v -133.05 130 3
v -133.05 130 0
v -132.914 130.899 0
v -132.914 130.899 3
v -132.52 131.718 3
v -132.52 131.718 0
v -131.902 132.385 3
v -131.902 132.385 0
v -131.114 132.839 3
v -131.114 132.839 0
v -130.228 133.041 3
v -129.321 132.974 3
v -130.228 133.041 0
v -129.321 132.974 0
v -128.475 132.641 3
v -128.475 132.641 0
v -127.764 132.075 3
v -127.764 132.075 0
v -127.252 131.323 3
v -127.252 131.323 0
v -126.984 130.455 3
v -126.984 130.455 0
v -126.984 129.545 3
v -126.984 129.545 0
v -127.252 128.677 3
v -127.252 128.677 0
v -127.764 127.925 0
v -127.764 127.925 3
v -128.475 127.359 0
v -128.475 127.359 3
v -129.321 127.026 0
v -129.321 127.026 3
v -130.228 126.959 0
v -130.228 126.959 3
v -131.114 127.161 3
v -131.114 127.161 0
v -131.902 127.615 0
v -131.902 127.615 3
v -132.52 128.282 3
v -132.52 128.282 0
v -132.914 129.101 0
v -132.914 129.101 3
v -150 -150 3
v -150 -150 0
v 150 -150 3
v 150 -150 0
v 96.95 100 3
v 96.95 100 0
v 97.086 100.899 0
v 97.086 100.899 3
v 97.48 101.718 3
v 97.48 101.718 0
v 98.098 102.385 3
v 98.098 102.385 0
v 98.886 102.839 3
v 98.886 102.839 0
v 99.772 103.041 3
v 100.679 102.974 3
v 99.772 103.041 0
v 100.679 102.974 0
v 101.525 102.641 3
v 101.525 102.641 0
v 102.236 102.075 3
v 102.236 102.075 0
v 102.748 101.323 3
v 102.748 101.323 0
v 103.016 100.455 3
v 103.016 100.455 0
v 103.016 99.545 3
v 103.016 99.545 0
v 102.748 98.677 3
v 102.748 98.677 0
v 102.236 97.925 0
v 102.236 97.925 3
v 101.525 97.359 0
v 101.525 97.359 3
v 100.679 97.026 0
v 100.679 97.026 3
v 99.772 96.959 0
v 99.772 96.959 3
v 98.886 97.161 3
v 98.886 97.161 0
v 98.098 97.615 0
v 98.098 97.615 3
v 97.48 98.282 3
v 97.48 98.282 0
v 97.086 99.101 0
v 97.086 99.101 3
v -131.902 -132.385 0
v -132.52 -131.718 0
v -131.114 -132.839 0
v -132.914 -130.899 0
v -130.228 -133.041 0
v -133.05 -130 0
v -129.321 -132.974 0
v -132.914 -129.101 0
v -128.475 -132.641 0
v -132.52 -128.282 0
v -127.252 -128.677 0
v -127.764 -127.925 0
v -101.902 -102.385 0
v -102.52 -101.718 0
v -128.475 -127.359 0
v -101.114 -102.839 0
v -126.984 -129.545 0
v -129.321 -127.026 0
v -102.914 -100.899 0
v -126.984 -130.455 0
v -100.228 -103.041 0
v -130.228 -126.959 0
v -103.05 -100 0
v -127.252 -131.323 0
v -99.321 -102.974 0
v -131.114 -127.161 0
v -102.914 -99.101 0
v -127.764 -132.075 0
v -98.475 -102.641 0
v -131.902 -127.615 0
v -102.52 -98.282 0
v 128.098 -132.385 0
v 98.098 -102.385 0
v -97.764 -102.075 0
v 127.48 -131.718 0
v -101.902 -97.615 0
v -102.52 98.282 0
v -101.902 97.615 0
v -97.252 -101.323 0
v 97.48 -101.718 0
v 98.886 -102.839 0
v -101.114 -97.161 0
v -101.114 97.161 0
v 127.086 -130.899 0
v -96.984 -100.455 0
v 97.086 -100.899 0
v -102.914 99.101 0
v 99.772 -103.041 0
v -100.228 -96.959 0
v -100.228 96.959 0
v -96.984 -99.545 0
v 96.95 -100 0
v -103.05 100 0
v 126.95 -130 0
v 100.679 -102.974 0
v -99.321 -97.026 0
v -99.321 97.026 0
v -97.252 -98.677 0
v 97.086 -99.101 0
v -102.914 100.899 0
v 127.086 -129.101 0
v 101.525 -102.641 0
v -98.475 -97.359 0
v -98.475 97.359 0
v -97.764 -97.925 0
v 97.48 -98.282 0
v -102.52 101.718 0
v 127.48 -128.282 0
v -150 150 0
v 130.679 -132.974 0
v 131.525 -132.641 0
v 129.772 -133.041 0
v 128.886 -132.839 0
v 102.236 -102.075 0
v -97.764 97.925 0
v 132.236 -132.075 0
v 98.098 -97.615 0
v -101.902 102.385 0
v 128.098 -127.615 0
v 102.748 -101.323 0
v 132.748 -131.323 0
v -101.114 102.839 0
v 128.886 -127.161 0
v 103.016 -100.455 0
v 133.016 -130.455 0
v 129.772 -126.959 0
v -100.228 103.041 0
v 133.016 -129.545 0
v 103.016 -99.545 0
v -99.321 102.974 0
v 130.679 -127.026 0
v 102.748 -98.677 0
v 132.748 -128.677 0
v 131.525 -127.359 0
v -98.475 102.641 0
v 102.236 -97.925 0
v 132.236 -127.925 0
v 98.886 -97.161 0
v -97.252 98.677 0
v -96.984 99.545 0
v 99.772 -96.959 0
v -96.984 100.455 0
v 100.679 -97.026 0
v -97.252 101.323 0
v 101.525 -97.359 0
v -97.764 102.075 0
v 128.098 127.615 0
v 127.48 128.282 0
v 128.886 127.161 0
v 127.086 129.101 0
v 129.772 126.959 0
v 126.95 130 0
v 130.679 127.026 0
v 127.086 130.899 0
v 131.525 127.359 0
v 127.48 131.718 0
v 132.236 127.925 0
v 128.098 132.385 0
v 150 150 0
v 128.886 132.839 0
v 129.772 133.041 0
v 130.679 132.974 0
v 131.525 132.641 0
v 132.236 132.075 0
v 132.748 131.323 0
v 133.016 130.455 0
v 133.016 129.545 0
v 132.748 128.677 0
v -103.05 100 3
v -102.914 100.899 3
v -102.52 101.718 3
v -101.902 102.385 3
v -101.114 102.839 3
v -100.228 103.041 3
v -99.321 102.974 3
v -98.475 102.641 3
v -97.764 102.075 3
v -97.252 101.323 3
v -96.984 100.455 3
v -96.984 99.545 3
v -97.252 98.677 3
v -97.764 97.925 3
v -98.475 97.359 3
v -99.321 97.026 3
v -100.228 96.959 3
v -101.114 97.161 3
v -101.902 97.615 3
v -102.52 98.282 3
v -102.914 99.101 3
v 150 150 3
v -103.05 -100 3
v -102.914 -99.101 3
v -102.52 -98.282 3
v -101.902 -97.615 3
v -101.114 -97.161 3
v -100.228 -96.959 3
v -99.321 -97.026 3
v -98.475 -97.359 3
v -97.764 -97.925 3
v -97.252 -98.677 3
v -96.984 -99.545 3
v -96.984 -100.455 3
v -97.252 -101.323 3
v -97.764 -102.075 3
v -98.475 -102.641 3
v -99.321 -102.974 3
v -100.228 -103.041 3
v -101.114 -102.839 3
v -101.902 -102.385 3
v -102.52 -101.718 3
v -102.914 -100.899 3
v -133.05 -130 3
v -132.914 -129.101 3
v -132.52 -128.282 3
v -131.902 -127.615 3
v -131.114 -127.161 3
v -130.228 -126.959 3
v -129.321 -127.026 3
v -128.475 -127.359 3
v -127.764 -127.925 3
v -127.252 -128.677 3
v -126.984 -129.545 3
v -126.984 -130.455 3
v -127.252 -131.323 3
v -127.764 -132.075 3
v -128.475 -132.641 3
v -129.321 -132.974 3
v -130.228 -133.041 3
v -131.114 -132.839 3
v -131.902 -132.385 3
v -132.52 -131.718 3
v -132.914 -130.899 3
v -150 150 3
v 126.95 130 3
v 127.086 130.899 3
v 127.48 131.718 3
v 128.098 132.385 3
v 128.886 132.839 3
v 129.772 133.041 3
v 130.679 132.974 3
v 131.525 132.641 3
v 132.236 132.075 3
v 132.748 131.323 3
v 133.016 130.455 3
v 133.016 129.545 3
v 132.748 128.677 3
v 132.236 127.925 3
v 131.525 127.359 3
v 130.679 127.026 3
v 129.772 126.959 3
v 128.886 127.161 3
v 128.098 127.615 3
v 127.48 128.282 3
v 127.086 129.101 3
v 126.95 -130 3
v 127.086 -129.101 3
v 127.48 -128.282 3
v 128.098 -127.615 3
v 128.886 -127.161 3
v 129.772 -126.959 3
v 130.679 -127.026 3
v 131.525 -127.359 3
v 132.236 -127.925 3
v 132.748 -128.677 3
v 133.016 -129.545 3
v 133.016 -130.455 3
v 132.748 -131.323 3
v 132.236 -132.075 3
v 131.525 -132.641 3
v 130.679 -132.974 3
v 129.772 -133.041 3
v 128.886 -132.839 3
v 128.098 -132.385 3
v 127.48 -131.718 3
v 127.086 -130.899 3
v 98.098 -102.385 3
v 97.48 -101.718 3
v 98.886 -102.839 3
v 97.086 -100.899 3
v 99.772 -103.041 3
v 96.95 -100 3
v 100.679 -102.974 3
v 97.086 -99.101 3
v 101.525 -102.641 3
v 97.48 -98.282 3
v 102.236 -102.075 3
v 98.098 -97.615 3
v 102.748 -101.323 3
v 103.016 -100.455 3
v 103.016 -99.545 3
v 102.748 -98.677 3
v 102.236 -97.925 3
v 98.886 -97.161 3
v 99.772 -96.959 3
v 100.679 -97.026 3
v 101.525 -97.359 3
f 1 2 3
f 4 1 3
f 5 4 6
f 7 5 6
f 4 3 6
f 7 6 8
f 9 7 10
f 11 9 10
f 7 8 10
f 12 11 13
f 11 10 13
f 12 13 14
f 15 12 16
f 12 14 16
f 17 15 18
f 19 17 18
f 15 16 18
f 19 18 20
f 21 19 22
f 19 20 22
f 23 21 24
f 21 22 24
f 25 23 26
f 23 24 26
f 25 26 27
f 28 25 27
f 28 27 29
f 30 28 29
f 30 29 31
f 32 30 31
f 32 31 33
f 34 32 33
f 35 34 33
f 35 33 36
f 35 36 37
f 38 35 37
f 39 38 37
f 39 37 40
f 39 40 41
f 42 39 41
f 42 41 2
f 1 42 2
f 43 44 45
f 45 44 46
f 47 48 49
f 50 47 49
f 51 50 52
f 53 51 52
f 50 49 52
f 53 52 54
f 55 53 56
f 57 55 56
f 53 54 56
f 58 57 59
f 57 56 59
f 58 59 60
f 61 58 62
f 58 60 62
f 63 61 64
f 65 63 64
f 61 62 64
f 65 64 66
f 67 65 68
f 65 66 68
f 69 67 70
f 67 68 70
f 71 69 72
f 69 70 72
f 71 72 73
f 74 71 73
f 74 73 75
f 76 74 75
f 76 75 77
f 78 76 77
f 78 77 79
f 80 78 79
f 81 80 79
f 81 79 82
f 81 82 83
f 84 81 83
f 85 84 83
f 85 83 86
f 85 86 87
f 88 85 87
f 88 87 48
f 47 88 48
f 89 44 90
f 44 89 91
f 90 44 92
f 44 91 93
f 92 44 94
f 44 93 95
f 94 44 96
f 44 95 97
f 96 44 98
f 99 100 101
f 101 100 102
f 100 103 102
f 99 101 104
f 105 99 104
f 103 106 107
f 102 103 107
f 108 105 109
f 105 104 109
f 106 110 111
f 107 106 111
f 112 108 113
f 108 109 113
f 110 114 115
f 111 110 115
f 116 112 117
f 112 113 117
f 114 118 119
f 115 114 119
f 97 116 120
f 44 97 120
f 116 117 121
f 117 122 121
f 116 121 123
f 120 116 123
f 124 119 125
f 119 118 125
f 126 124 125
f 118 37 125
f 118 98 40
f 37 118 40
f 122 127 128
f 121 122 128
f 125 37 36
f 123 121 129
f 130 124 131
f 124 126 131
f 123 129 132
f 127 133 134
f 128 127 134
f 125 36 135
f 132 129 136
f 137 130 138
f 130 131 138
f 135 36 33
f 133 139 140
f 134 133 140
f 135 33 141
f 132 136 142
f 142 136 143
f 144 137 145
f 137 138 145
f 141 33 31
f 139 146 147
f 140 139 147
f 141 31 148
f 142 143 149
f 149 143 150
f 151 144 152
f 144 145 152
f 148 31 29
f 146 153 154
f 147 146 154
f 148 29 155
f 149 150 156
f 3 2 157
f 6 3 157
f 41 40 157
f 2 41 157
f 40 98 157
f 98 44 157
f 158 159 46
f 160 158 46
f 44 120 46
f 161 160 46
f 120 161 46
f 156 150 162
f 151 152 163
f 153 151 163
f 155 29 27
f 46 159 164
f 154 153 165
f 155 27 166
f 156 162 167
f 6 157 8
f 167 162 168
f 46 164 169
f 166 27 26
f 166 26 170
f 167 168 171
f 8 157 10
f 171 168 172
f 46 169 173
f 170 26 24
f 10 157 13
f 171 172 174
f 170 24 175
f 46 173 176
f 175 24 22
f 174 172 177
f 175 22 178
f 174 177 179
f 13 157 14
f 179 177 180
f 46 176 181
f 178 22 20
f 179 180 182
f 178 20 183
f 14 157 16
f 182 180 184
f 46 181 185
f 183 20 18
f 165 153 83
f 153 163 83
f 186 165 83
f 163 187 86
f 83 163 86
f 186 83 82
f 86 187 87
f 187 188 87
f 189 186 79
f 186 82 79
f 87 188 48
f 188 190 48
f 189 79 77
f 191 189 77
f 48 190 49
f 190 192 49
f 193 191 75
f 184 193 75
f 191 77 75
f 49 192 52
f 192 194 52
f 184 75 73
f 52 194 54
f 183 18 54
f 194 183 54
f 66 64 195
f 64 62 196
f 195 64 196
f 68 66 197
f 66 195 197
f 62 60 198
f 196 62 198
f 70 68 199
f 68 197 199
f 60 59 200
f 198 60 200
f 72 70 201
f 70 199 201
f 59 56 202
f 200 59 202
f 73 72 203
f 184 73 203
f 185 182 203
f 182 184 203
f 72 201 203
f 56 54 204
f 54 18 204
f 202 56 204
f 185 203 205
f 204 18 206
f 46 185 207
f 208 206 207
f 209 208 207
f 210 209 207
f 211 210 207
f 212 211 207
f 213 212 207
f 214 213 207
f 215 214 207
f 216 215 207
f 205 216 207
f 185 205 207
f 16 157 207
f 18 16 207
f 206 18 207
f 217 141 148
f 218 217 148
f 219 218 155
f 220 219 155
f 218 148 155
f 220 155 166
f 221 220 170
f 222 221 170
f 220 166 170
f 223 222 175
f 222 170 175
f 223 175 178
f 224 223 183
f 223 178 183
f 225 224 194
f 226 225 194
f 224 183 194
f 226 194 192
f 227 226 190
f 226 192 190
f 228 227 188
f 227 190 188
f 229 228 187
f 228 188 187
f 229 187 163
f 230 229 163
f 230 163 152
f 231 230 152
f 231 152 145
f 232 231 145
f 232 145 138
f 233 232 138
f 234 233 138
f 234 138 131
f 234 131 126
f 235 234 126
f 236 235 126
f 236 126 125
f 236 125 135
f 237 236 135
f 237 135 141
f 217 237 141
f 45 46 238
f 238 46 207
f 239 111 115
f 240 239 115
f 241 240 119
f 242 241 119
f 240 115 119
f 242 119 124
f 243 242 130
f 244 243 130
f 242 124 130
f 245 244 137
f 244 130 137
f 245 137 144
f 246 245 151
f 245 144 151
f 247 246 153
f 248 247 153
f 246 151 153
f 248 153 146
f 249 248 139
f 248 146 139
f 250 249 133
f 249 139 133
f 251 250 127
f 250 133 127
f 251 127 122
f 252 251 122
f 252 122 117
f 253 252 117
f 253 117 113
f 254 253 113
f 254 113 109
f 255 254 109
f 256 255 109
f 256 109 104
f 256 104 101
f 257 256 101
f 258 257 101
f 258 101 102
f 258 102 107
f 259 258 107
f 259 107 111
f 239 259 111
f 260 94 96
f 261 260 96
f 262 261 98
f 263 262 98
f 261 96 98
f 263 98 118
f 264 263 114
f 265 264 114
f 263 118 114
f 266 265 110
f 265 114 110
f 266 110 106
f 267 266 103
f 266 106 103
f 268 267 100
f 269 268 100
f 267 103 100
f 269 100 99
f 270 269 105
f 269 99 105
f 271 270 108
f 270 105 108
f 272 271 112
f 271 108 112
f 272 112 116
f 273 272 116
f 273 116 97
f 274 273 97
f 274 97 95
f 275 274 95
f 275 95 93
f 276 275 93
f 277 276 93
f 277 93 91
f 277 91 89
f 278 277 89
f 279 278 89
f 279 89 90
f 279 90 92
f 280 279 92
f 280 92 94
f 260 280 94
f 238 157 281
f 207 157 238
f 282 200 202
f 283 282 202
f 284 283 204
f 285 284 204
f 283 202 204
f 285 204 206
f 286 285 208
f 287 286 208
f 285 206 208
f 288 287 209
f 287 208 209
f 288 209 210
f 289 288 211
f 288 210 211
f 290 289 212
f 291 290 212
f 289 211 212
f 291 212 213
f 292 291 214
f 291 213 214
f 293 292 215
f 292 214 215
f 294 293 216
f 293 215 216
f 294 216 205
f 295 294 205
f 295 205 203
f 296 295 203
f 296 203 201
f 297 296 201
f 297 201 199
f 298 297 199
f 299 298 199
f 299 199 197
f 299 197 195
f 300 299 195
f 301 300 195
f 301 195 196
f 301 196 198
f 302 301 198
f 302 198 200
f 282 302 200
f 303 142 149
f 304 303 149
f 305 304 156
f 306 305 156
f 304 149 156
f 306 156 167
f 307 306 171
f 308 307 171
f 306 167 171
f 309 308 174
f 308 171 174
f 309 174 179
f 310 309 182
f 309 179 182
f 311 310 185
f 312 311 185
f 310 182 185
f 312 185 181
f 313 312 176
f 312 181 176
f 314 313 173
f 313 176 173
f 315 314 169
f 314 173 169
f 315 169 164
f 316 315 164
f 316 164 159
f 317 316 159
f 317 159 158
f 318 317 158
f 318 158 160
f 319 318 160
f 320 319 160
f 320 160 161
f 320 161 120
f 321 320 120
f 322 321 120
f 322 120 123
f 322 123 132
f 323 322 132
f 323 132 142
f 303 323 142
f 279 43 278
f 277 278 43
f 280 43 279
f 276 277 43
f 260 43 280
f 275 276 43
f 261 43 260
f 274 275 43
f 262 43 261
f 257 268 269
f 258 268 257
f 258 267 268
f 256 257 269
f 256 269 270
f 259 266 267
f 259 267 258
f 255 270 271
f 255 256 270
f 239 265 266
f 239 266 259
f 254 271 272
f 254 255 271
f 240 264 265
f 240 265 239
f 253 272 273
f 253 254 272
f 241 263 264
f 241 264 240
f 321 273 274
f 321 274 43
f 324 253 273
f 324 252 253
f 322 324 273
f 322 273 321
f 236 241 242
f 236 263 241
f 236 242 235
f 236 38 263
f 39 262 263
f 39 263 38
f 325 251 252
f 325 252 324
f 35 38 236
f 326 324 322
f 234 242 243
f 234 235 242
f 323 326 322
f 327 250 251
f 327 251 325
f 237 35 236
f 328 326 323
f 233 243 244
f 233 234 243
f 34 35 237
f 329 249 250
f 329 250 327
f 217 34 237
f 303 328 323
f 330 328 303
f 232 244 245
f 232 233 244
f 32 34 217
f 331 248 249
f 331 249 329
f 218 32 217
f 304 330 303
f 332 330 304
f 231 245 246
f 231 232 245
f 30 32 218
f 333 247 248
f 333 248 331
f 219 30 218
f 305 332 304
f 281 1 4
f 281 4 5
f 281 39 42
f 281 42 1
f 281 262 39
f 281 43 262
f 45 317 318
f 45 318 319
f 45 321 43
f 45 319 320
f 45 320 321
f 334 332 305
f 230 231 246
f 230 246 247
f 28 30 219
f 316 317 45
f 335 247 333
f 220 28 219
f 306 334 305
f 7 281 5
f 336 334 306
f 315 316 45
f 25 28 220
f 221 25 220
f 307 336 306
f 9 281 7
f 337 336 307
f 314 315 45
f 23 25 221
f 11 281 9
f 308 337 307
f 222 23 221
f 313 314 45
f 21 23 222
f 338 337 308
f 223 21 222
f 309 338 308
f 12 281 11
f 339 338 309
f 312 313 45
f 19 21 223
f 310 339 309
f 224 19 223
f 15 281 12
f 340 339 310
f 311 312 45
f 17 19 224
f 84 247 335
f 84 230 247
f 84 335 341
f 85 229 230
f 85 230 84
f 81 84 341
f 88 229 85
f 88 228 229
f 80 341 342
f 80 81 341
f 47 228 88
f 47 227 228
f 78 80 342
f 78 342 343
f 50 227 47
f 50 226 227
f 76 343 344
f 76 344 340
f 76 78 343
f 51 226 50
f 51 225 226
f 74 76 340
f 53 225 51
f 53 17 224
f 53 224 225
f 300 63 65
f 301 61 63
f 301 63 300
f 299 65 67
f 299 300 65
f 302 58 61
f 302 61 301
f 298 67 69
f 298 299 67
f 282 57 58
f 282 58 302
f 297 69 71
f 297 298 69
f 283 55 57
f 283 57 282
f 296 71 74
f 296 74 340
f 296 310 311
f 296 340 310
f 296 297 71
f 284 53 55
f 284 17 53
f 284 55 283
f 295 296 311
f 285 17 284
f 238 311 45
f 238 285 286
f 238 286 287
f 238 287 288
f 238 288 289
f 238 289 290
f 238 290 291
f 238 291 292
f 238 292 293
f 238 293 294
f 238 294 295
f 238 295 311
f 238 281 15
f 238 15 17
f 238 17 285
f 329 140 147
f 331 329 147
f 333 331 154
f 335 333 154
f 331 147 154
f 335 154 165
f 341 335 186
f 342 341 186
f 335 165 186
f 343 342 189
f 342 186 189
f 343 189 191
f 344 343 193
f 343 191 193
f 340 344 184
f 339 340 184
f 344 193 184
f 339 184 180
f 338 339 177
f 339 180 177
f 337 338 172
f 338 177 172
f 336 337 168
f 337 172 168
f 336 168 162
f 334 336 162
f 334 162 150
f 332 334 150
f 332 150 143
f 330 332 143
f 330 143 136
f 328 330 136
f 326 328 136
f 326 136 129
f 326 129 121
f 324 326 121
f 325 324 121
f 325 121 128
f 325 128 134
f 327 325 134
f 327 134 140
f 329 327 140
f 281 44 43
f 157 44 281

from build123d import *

# Parameters (mm, degrees)
SKETCH1_W                      = 300
SKETCH1_H                      = 300
BOSS_EXTRUDE1_DEPTH            = 3
F_6_1_6_1_DIAMETER_HOLE1_D     = 6.1
F_6_1_6_1_DIAMETER_HOLE1_DEPTH = 23
F_6_1_6_1_DIAMETER_HOLE1_TIP   = 1.832624888


with BuildPart() as part:
    # Sketch1 → Boss-Extrude1 (new body)
    with BuildSketch(Plane.XY):
        Rectangle(SKETCH1_W, SKETCH1_H)
    extrude(amount=BOSS_EXTRUDE1_DEPTH)

    # Ø6.1 (6.1) Diameter Hole1
    with Locations(Plane.XY.offset(3)):
        with Locations((-130, -130), (-100, -100), (130, -130), (100, -100), (130, 130), (-100, 100), (-130, 130), (100, 100)):
            Hole(F_6_1_6_1_DIAMETER_HOLE1_D / 2, depth=F_6_1_6_1_DIAMETER_HOLE1_DEPTH)
            with Locations((0, 0, -(F_6_1_6_1_DIAMETER_HOLE1_DEPTH + F_6_1_6_1_DIAMETER_HOLE1_TIP / 2))):  # 118° drill point
                Cone(0, F_6_1_6_1_DIAMETER_HOLE1_D / 2, F_6_1_6_1_DIAMETER_HOLE1_TIP, mode=Mode.SUBTRACT)


solid = part.part
